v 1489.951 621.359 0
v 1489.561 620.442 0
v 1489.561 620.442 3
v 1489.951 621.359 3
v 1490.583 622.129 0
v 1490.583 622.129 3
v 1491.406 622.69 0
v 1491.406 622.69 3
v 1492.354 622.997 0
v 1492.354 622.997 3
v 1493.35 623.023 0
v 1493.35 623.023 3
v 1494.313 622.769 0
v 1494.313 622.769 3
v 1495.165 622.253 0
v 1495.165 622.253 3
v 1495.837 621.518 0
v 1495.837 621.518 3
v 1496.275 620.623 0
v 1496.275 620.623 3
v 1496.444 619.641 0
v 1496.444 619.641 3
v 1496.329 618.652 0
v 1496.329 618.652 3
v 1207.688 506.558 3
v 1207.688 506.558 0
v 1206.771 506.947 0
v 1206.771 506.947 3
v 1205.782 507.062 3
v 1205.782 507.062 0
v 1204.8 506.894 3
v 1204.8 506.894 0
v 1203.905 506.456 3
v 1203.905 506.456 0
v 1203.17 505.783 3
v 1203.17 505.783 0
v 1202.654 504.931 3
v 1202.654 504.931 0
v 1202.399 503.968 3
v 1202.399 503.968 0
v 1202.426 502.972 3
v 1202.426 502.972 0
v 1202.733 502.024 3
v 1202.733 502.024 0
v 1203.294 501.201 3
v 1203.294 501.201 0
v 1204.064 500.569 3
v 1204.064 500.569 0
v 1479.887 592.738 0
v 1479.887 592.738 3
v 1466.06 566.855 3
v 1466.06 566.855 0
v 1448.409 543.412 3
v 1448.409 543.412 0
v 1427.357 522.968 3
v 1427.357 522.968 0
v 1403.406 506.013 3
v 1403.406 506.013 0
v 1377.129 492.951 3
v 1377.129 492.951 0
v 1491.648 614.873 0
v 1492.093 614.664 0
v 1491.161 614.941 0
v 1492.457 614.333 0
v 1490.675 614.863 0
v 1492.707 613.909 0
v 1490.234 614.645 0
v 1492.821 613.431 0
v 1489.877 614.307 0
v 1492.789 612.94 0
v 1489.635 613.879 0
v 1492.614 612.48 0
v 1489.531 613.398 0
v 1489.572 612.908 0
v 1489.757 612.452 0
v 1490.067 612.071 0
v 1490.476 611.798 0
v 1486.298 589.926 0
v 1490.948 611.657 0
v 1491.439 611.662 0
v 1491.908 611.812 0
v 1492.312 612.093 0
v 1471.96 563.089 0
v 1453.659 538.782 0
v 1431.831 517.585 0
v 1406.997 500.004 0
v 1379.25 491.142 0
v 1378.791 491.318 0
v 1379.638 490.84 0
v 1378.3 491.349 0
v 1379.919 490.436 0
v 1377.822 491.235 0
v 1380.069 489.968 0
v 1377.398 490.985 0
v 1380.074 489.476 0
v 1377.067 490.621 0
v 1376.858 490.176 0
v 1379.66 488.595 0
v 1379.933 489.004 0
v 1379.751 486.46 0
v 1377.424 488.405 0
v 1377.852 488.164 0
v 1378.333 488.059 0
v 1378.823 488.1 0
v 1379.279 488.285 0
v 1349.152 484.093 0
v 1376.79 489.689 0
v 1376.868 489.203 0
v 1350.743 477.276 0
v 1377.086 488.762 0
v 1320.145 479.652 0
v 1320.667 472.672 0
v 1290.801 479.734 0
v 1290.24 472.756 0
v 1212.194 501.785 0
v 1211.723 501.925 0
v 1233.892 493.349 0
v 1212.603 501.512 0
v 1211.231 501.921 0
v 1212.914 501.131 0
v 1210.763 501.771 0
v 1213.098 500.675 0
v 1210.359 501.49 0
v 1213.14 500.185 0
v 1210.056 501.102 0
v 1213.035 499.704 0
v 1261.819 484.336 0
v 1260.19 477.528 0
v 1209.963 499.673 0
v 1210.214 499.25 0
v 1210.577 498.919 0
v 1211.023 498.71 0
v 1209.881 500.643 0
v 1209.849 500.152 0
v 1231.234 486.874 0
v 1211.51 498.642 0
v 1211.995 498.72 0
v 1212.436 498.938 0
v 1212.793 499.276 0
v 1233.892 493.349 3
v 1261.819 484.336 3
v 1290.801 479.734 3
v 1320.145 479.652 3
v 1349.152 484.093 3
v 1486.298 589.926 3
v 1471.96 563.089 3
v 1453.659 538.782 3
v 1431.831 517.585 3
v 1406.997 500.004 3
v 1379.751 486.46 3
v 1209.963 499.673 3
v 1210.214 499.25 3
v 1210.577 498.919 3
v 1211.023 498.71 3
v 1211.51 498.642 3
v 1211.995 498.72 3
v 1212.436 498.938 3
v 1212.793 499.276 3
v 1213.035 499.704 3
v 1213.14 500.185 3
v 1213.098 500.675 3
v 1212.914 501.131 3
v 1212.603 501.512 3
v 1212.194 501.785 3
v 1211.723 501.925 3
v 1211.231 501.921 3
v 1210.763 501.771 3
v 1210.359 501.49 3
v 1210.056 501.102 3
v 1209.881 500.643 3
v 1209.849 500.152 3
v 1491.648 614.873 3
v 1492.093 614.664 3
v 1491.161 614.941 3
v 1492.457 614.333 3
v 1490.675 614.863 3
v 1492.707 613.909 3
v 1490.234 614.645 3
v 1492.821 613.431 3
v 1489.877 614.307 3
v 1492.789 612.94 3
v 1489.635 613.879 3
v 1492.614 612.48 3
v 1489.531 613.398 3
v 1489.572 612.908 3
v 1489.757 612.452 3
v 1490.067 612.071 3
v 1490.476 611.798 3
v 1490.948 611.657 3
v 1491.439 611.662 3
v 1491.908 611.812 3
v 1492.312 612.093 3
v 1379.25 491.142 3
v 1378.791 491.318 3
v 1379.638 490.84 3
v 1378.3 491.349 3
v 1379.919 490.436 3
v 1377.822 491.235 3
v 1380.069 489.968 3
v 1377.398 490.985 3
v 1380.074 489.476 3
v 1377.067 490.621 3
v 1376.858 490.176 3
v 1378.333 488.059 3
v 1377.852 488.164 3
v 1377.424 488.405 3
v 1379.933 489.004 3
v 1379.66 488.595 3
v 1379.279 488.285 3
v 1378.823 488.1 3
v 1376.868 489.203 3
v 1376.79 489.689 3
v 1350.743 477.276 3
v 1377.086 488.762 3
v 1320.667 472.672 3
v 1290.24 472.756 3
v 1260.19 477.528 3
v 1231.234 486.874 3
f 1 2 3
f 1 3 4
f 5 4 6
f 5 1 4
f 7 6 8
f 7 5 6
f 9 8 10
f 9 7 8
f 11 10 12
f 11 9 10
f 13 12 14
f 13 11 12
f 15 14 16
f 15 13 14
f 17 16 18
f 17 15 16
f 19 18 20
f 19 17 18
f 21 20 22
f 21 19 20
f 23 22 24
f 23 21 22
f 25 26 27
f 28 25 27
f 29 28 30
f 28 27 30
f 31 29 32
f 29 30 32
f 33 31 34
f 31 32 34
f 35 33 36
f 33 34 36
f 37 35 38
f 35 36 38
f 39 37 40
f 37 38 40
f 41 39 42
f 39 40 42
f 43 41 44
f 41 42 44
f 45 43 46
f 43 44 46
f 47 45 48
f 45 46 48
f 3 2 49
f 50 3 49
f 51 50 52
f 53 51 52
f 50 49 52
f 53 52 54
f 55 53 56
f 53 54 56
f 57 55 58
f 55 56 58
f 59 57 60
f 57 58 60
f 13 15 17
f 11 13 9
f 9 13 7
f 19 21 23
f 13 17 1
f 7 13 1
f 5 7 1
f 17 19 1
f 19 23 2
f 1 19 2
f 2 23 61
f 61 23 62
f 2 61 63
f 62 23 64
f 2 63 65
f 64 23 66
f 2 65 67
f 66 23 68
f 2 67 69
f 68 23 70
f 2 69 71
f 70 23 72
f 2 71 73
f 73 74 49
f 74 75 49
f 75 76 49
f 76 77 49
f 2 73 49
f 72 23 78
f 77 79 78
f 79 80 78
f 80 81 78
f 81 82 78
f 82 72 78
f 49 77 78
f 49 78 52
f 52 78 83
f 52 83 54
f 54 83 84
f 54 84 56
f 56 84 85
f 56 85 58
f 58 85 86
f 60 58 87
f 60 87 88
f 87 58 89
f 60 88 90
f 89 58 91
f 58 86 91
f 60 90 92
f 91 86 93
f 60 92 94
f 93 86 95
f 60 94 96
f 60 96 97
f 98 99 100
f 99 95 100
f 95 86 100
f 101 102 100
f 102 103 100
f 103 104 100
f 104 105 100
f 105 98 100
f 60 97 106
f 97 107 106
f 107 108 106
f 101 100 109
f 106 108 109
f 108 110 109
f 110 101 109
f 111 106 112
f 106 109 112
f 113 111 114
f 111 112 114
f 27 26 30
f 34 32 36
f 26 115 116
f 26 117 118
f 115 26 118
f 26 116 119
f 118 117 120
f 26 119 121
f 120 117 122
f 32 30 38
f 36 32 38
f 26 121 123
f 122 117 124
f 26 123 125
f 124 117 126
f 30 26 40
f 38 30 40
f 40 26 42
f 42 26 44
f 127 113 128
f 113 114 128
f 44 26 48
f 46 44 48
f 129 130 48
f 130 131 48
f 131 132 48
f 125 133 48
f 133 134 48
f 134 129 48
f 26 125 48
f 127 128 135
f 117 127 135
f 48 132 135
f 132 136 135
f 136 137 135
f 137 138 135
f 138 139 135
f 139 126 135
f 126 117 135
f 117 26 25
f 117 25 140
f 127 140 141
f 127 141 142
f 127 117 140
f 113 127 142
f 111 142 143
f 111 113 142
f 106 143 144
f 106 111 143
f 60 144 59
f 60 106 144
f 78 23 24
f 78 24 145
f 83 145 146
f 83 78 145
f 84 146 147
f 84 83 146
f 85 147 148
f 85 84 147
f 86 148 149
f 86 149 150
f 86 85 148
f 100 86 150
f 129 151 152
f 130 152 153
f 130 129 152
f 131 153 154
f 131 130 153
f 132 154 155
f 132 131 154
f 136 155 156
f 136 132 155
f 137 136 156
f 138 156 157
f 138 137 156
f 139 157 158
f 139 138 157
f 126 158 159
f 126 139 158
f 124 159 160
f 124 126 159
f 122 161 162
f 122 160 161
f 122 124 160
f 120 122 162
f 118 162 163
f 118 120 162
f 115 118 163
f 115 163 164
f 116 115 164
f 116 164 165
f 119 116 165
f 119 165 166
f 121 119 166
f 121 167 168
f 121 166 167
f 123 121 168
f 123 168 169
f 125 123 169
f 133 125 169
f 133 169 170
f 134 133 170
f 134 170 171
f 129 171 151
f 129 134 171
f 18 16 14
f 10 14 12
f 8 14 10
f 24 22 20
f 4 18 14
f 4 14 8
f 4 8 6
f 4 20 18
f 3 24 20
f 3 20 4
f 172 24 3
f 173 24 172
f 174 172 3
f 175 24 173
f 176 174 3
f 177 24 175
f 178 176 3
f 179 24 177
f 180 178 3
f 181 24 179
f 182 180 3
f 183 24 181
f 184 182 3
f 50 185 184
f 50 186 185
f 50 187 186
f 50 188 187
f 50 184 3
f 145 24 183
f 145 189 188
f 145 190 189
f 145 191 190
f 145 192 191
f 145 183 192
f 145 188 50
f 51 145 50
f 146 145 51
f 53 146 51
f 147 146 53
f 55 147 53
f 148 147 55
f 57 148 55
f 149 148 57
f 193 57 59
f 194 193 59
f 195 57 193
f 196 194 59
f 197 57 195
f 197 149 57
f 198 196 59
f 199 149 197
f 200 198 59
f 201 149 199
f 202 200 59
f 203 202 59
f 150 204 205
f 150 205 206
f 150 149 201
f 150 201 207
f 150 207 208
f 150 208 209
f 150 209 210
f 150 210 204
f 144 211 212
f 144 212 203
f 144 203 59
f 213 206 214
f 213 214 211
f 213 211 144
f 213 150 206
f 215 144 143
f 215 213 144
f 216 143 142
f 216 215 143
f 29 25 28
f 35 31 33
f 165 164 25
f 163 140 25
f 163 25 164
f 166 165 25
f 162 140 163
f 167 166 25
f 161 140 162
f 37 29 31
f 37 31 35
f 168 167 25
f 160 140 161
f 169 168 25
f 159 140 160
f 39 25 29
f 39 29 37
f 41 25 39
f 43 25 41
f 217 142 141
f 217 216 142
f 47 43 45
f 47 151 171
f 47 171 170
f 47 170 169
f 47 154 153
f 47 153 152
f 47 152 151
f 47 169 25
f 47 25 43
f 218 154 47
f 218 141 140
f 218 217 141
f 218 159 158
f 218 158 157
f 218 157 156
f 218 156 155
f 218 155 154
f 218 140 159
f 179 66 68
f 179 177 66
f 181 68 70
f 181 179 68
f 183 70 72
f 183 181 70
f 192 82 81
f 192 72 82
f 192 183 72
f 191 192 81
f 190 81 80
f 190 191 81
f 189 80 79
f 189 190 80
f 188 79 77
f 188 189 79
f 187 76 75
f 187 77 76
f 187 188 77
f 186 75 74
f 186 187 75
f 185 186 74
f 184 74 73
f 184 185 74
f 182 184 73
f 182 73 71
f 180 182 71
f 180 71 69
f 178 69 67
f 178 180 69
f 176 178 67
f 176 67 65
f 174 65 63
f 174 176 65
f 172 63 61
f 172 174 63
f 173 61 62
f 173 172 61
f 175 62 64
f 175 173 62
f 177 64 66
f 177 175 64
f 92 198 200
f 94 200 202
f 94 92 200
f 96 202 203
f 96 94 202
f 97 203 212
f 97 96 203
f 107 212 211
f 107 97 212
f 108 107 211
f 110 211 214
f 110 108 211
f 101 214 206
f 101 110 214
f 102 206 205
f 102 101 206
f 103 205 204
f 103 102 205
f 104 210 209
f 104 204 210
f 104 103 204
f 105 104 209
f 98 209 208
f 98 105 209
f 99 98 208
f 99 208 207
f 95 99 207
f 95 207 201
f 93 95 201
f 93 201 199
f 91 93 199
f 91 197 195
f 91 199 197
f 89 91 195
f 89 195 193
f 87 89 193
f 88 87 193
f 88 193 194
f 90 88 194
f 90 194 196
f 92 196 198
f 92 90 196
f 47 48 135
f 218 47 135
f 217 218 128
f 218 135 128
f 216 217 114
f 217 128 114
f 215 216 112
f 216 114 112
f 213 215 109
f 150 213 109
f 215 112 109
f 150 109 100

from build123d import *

# Parameters (mm, degrees)
PAD015_DEPTH                        = 3
SKETCH054_R                         = 1.65
POCKET018_DEPTH                     = 358.938883
POCKET018_DEPTH_BACK                = 361.938883
BODY001003005003004_PLACEMENT_ANGLE = 60
CLONE004_PLACEMENT_ANGLE            = 142


with BuildPart() as part:
    # Sketch053 → Pad015 (new body)
    with BuildSketch(Plane.XY):
        with BuildLine():
            ThreePointArc((152.005097, 113.785532), (84.992984, 169.790723), (0, 189.875477))
            Line((0, 189.875477), (0, 196.875477))
            ThreePointArc((157.608957, 117.98038), (88.126358, 176.050273), (0, 196.875477))
            ThreePointArc((152.005097, 113.785532), (156.904451, 113.081026), (157.608957, 117.98038))
        make_face()
    pad015 = extrude(amount=PAD015_DEPTH)

    # Sketch054 → Pocket018 (cut, two sides)
    with BuildSketch(Plane.XY) as pocket018_sk:
        with Locations((150.82443, 121.020933)):
            Circle(SKETCH054_R)
        with BuildLine():
            ThreePointArc((0, 191.725477), (1.65, 193.375477), (0, 195.025477))
            Line((0, 191.725477), (0, 195.025477))
        make_face()
    pocket018 = extrude(amount=-POCKET018_DEPTH, mode=Mode.SUBTRACT) + extrude(pocket018_sk.sketch, amount=POCKET018_DEPTH_BACK, mode=Mode.SUBTRACT)

    # Mirrored020: Pad015, Pocket018 across Sketch053 V_Axis
    add(pad015.mirror(Plane(origin=(0, 0, 0), x_dir=(0, 0, 1), z_dir=(1, 0, 0))))
    add(pocket018.mirror(Plane(origin=(0, 0, 0), x_dir=(0, 0, 1), z_dir=(1, 0, 0))), mode=Mode.SUBTRACT)


with BuildPart() as part_1:
    # Body001003005003004 placement: moved
    add(part.part.rotate(Axis((0, 0, 0), (0, 0, 1)), BODY001003005003004_PLACEMENT_ANGLE))


with BuildPart() as part_2:
    # Clone004 placement: moved
    add(part_1.part.moved(Location((1306, 669, 0))).rotate(Axis((1306, 669, 0), (0, 0, 1)), CLONE004_PLACEMENT_ANGLE))


solid = part_2.part
